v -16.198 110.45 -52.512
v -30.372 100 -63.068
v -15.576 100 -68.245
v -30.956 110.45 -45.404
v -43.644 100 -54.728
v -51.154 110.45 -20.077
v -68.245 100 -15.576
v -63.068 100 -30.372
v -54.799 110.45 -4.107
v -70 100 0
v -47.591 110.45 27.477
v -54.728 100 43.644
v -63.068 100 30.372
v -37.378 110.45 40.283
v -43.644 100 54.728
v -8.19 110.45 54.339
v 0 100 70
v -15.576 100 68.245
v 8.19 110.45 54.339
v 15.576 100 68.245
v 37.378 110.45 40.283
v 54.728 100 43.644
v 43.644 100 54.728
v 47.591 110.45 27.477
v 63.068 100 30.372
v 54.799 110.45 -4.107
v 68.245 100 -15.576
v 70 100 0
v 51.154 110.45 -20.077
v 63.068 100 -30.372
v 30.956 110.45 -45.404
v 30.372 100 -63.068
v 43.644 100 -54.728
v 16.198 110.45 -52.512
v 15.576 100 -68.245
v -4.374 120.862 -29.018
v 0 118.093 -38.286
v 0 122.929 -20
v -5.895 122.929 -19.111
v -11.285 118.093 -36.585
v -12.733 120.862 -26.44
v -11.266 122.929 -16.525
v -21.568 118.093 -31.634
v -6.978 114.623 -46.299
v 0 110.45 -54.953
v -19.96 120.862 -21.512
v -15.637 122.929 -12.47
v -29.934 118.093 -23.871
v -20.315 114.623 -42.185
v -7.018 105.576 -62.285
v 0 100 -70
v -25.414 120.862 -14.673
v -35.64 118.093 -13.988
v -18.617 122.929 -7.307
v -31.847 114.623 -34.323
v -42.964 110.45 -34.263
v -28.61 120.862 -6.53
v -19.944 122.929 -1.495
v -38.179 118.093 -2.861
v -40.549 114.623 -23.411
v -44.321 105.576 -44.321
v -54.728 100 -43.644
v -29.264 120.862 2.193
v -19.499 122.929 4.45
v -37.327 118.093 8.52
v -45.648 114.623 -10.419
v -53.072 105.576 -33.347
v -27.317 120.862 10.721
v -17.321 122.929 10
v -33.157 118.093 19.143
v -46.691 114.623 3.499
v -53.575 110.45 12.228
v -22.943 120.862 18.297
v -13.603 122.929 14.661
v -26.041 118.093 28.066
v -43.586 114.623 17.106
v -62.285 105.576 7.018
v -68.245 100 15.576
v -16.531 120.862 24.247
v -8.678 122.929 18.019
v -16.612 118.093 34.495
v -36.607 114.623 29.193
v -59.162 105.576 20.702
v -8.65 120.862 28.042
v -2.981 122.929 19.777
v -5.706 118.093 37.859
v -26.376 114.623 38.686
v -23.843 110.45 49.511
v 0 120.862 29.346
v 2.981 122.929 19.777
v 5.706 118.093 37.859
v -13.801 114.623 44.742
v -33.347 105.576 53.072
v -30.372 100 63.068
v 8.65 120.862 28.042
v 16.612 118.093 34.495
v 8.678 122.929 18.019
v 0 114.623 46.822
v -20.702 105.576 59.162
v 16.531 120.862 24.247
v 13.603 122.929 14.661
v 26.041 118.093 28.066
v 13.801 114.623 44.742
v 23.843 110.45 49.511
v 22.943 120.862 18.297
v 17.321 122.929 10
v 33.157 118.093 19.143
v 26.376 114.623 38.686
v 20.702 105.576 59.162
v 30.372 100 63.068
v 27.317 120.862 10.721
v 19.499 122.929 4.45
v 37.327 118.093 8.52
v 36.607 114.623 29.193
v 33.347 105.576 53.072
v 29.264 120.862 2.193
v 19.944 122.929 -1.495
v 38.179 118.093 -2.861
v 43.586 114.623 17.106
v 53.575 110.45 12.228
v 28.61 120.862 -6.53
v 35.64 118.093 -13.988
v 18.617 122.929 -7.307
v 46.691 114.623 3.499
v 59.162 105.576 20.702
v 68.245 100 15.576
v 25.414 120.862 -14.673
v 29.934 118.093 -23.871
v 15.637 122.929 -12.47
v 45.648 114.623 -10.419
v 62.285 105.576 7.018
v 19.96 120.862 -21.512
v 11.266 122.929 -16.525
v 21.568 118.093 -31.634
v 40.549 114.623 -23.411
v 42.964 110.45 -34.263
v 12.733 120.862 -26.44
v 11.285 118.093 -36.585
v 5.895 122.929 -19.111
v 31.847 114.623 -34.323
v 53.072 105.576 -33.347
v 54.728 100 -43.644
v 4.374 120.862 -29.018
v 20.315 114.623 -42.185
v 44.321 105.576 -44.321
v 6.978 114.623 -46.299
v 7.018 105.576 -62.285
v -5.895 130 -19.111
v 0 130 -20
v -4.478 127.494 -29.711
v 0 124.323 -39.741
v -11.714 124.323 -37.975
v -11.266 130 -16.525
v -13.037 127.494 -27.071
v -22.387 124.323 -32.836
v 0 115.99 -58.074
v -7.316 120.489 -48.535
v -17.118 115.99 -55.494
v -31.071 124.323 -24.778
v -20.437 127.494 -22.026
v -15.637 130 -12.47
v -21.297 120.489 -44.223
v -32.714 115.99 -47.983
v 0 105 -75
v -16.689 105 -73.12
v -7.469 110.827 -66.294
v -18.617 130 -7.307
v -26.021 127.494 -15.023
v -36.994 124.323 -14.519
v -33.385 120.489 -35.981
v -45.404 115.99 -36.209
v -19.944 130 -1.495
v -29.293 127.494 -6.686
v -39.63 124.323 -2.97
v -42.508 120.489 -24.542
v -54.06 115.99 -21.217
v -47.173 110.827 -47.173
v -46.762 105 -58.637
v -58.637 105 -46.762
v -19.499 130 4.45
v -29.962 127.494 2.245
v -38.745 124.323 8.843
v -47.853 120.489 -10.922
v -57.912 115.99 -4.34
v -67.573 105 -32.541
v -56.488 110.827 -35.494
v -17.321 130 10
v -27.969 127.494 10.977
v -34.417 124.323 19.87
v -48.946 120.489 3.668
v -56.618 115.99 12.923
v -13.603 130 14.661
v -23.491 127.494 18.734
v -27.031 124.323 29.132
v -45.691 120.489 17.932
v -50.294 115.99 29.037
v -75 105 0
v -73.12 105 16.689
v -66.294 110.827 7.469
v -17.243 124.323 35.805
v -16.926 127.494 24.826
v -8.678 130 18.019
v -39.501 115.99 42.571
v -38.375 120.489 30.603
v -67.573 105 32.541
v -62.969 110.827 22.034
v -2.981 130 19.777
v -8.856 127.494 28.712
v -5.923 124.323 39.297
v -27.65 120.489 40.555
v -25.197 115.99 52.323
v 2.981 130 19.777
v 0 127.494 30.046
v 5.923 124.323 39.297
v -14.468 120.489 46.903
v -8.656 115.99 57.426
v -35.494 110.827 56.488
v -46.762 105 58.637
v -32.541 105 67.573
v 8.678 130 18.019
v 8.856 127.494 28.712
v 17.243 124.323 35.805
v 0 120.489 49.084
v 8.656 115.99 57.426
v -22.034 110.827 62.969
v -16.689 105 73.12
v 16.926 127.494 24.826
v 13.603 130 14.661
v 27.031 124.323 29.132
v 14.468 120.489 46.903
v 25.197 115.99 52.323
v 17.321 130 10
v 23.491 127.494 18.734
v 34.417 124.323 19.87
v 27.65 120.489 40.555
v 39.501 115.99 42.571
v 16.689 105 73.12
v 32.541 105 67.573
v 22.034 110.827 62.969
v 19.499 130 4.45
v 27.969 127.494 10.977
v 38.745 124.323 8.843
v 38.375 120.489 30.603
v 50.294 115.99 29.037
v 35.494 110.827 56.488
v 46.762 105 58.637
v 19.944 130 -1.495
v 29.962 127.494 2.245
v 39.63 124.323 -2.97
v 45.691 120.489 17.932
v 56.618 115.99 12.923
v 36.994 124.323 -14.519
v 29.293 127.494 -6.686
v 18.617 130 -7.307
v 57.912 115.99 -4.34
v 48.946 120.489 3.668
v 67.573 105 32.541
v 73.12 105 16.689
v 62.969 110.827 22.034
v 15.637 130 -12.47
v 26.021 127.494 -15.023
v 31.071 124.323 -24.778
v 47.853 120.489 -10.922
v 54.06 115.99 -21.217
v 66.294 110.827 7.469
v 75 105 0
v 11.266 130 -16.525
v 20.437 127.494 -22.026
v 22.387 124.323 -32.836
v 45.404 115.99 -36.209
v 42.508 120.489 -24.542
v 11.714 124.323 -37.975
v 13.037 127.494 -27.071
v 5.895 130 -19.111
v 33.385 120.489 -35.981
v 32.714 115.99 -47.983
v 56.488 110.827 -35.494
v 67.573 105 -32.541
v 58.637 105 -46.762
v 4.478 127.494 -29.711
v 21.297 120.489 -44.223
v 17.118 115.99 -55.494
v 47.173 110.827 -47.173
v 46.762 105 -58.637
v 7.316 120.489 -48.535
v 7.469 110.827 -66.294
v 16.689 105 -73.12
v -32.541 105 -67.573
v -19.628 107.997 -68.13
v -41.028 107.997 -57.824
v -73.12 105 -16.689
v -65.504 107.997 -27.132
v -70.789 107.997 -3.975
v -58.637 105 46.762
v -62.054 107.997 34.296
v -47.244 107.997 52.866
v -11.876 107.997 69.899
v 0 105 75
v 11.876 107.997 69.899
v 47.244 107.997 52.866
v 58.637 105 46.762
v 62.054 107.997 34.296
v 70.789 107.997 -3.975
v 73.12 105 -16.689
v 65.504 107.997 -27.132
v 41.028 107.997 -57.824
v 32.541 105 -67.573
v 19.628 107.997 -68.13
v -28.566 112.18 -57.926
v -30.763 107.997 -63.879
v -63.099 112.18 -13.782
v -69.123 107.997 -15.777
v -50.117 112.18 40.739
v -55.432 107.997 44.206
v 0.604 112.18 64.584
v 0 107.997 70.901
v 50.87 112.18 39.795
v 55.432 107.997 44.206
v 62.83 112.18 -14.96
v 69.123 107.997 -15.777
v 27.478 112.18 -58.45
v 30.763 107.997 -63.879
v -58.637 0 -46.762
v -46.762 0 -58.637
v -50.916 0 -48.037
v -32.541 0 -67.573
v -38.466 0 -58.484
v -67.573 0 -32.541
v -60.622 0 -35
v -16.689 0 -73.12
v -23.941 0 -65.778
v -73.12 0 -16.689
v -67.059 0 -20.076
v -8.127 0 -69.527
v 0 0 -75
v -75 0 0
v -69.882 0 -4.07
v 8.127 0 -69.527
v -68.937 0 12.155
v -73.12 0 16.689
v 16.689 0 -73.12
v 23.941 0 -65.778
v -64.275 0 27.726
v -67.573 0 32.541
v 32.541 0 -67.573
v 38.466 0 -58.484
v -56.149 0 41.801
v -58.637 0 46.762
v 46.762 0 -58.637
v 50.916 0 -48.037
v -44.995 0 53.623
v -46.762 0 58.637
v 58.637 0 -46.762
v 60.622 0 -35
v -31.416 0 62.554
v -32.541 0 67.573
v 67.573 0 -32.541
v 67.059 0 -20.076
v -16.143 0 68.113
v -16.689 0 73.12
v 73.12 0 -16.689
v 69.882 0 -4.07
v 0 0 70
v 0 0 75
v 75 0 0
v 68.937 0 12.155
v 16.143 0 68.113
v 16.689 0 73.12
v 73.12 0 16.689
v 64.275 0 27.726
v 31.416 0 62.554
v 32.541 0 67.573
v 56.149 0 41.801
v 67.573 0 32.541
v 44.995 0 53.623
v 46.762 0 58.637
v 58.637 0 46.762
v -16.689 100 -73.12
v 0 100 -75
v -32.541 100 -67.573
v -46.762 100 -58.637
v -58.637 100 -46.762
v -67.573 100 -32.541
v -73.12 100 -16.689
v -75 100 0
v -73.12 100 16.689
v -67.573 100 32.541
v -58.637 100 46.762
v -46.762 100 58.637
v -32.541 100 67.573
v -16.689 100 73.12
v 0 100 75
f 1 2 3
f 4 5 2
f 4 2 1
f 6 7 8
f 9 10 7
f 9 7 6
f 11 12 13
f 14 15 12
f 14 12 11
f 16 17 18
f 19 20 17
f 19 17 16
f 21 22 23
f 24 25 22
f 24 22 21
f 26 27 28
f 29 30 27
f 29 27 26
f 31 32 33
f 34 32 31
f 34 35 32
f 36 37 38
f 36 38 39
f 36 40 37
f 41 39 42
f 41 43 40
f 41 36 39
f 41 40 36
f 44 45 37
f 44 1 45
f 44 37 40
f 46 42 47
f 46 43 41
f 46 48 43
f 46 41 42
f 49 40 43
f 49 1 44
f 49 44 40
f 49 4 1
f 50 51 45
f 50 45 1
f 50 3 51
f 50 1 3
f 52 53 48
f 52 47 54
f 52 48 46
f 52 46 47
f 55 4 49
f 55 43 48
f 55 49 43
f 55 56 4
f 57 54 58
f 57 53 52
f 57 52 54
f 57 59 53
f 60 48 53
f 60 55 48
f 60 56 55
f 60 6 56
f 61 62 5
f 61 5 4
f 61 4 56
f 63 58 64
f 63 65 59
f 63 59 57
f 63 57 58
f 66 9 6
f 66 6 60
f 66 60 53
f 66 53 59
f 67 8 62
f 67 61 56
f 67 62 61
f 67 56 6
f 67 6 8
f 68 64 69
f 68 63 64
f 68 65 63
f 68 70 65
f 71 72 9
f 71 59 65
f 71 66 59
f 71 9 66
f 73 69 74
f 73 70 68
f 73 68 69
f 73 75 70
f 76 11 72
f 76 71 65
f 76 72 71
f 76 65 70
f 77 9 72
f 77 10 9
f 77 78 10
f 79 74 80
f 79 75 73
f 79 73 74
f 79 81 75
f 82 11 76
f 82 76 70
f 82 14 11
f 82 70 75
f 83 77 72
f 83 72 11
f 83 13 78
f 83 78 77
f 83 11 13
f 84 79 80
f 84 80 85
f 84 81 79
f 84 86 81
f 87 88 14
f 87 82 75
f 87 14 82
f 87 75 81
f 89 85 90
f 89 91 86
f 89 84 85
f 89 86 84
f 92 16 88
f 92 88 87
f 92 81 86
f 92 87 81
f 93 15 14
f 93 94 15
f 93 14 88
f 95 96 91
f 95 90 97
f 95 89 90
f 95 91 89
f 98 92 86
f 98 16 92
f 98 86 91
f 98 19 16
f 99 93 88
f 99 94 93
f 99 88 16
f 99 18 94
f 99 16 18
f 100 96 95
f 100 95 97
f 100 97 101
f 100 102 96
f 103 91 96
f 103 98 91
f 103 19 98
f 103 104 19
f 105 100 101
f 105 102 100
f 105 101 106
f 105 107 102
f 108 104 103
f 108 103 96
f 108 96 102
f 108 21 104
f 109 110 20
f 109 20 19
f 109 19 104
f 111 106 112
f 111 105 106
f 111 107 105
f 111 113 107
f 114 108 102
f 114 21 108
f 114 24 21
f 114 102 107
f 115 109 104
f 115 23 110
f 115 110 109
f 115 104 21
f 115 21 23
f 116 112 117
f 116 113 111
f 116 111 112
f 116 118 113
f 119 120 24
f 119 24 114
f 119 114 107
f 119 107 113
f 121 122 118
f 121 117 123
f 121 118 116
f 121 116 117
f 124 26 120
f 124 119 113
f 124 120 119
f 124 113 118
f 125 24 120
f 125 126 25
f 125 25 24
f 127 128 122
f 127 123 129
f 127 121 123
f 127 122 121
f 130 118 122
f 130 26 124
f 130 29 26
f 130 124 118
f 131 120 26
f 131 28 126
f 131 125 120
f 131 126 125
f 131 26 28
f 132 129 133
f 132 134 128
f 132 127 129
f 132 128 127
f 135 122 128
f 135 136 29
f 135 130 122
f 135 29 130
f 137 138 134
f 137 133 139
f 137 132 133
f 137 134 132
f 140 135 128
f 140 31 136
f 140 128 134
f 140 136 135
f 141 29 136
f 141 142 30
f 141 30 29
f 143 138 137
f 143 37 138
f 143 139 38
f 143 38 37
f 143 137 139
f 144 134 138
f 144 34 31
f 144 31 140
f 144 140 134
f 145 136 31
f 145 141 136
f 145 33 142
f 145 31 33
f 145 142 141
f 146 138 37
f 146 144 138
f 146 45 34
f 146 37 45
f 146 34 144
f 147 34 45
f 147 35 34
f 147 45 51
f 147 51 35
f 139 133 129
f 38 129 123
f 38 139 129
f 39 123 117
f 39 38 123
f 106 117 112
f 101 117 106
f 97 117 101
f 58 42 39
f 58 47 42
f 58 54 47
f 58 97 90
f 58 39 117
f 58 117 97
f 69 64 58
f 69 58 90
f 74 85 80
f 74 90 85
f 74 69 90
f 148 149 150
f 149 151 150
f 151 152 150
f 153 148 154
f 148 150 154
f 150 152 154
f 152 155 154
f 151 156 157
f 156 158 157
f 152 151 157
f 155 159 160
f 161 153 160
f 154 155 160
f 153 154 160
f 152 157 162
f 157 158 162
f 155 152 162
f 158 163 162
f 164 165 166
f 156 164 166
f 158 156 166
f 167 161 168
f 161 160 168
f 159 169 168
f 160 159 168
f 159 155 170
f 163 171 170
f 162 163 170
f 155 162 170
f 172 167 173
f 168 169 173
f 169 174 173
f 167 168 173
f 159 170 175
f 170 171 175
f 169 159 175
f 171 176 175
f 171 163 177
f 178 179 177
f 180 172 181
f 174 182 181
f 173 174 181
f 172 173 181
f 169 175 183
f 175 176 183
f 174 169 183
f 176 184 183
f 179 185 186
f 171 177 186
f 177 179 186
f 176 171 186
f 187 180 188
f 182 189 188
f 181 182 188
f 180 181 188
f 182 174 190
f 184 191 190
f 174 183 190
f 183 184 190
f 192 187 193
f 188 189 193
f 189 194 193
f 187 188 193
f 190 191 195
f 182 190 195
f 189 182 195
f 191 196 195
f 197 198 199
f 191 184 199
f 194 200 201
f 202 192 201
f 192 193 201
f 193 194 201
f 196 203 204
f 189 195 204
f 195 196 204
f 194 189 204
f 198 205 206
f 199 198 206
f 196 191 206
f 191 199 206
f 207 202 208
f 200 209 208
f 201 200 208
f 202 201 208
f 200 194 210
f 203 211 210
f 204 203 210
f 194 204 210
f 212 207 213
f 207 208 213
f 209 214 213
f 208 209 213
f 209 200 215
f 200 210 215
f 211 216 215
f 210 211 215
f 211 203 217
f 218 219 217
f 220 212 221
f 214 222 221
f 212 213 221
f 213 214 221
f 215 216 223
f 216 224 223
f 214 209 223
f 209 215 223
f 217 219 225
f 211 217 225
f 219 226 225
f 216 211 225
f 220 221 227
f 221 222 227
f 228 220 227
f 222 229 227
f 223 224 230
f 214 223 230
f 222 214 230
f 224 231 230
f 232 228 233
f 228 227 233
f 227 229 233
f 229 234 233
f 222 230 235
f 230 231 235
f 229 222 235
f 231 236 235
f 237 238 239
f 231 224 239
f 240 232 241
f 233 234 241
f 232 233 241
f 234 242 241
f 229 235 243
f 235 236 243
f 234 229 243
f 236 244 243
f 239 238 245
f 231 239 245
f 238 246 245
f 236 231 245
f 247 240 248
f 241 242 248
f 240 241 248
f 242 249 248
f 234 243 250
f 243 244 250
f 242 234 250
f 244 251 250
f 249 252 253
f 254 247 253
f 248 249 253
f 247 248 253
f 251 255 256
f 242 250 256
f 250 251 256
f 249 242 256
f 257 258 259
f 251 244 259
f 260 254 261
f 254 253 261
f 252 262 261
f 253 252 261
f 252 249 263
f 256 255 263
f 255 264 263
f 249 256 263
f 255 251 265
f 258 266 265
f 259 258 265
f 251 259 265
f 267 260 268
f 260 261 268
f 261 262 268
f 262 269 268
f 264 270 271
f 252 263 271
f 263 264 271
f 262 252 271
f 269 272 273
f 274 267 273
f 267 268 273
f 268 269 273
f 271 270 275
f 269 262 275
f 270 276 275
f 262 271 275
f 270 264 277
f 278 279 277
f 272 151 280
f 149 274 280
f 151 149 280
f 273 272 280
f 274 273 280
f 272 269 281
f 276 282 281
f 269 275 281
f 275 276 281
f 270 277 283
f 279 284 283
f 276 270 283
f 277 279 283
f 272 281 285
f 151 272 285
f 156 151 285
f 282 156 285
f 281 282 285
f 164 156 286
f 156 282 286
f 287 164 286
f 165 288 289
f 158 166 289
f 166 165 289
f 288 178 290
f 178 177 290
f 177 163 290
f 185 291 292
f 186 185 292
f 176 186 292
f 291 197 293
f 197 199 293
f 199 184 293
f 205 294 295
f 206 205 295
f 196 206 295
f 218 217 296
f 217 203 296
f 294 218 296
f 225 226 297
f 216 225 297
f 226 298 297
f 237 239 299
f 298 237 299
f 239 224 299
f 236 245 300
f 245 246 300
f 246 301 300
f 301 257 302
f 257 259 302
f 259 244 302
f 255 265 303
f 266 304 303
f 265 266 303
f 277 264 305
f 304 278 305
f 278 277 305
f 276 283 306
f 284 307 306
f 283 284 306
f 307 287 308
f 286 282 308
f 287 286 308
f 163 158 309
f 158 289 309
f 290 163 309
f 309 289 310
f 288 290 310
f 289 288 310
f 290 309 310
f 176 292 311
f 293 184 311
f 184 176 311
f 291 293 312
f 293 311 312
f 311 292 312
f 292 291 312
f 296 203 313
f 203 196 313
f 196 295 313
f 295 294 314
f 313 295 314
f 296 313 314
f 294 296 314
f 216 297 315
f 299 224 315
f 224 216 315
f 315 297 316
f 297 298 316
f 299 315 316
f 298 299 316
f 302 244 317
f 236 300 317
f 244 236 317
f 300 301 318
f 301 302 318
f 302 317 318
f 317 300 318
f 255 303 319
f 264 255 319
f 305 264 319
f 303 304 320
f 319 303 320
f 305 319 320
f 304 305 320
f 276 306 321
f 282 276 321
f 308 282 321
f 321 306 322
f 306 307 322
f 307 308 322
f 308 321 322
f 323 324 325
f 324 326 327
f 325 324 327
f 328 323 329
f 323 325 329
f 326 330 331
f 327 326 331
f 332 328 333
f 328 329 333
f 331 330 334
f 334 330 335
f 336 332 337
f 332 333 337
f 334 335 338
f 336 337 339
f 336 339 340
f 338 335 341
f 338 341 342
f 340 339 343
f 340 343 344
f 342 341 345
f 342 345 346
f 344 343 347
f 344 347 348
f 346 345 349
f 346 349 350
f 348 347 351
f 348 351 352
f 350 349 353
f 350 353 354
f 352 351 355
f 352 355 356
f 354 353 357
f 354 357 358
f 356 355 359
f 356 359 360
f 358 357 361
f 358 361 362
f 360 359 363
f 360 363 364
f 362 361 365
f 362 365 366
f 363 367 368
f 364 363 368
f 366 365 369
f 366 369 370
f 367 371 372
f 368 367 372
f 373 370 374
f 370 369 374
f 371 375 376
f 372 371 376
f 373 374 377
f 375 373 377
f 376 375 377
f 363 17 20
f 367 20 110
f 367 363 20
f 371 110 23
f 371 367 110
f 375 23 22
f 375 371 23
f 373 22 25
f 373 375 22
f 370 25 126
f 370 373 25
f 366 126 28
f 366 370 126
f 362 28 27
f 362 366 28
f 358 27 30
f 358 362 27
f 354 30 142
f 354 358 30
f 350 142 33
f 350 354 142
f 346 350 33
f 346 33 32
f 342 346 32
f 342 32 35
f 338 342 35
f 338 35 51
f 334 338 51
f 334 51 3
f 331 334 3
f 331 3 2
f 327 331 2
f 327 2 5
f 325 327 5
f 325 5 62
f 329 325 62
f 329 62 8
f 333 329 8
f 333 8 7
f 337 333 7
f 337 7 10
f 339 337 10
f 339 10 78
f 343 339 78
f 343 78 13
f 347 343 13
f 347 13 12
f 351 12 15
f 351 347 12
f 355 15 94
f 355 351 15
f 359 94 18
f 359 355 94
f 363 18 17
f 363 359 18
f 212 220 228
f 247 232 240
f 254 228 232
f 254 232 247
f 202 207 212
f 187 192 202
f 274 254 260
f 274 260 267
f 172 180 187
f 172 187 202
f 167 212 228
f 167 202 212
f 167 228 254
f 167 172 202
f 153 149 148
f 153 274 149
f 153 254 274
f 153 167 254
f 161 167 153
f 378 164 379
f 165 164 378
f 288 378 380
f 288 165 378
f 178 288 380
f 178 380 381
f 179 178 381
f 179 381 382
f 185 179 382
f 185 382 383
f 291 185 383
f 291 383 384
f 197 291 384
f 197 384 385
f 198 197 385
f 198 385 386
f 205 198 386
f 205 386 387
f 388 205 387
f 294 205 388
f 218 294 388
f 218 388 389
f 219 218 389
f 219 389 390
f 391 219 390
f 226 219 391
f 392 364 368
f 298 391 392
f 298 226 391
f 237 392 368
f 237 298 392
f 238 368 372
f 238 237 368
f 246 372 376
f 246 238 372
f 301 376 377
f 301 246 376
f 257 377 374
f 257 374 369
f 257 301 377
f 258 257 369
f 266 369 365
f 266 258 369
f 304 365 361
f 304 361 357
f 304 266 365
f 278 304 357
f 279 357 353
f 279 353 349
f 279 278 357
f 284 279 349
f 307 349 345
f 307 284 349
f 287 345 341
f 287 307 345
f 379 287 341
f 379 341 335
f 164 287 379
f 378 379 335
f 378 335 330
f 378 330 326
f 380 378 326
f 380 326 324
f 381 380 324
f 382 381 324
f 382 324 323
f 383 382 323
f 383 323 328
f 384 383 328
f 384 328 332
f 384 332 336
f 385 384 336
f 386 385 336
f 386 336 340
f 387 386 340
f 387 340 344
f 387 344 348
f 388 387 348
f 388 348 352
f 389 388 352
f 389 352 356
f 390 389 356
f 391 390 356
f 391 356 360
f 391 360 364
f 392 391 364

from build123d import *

# Parameters (mm, degrees)
SKETCH1_R           = 75
SKETCH1_R_2         = 70
BOSS_EXTRUDE1_DEPTH = 100


with BuildPart() as part:
    # Sketch1 → Boss-Extrude1 (new body)
    with BuildSketch(Plane(origin=(0, 0, 0), x_dir=(1, 0, 0), z_dir=(0, 1, 0))):
        with Locations(Location((0, 0, 0), (0, 0, 270))):
            Circle(SKETCH1_R)
        with Locations(Location((0, 0, 0), (0, 0, 270))):
            Circle(SKETCH1_R_2, mode=Mode.SUBTRACT)
    extrude(amount=BOSS_EXTRUDE1_DEPTH)

    # Sketch3 → Revolve1 (revolve)
    with BuildSketch(Plane(origin=(0, 0, 0), x_dir=(0, 0, -1), z_dir=(1, 0, 0)), mode=Mode.PRIVATE) as revolve1_sk:
        with BuildLine():
            Line((-70, 100), (-75, 100))
            Line((-75, 100), (-75, 105))
            add(Edge.make_bspline(
                [(-20, 130), (-50.667187392, 123.477390111), (-75, 105)],
                knots=[0, 0, 0, 1, 1, 1], degree=2))
            Line((-20, 130), (0, 130))
            Line((0, 130), (0, 122.928932188))
            Line((0, 122.928932188), (-20, 122.928932188))
            add(Edge.make_bspline(
                [(-20, 122.928932188), (-48.64448062, 117.780957156), (-70, 100)],
                knots=[0, 0, 0, 1, 1, 1], degree=2))
        make_face()
    revolve(revolve1_sk.sketch.rotate(Axis((0, -20.154872571, 0), (0, 1, 0)), 180), axis=Axis((0, -20.154872571, 0), (0, 1, 0)))


solid = part.part
